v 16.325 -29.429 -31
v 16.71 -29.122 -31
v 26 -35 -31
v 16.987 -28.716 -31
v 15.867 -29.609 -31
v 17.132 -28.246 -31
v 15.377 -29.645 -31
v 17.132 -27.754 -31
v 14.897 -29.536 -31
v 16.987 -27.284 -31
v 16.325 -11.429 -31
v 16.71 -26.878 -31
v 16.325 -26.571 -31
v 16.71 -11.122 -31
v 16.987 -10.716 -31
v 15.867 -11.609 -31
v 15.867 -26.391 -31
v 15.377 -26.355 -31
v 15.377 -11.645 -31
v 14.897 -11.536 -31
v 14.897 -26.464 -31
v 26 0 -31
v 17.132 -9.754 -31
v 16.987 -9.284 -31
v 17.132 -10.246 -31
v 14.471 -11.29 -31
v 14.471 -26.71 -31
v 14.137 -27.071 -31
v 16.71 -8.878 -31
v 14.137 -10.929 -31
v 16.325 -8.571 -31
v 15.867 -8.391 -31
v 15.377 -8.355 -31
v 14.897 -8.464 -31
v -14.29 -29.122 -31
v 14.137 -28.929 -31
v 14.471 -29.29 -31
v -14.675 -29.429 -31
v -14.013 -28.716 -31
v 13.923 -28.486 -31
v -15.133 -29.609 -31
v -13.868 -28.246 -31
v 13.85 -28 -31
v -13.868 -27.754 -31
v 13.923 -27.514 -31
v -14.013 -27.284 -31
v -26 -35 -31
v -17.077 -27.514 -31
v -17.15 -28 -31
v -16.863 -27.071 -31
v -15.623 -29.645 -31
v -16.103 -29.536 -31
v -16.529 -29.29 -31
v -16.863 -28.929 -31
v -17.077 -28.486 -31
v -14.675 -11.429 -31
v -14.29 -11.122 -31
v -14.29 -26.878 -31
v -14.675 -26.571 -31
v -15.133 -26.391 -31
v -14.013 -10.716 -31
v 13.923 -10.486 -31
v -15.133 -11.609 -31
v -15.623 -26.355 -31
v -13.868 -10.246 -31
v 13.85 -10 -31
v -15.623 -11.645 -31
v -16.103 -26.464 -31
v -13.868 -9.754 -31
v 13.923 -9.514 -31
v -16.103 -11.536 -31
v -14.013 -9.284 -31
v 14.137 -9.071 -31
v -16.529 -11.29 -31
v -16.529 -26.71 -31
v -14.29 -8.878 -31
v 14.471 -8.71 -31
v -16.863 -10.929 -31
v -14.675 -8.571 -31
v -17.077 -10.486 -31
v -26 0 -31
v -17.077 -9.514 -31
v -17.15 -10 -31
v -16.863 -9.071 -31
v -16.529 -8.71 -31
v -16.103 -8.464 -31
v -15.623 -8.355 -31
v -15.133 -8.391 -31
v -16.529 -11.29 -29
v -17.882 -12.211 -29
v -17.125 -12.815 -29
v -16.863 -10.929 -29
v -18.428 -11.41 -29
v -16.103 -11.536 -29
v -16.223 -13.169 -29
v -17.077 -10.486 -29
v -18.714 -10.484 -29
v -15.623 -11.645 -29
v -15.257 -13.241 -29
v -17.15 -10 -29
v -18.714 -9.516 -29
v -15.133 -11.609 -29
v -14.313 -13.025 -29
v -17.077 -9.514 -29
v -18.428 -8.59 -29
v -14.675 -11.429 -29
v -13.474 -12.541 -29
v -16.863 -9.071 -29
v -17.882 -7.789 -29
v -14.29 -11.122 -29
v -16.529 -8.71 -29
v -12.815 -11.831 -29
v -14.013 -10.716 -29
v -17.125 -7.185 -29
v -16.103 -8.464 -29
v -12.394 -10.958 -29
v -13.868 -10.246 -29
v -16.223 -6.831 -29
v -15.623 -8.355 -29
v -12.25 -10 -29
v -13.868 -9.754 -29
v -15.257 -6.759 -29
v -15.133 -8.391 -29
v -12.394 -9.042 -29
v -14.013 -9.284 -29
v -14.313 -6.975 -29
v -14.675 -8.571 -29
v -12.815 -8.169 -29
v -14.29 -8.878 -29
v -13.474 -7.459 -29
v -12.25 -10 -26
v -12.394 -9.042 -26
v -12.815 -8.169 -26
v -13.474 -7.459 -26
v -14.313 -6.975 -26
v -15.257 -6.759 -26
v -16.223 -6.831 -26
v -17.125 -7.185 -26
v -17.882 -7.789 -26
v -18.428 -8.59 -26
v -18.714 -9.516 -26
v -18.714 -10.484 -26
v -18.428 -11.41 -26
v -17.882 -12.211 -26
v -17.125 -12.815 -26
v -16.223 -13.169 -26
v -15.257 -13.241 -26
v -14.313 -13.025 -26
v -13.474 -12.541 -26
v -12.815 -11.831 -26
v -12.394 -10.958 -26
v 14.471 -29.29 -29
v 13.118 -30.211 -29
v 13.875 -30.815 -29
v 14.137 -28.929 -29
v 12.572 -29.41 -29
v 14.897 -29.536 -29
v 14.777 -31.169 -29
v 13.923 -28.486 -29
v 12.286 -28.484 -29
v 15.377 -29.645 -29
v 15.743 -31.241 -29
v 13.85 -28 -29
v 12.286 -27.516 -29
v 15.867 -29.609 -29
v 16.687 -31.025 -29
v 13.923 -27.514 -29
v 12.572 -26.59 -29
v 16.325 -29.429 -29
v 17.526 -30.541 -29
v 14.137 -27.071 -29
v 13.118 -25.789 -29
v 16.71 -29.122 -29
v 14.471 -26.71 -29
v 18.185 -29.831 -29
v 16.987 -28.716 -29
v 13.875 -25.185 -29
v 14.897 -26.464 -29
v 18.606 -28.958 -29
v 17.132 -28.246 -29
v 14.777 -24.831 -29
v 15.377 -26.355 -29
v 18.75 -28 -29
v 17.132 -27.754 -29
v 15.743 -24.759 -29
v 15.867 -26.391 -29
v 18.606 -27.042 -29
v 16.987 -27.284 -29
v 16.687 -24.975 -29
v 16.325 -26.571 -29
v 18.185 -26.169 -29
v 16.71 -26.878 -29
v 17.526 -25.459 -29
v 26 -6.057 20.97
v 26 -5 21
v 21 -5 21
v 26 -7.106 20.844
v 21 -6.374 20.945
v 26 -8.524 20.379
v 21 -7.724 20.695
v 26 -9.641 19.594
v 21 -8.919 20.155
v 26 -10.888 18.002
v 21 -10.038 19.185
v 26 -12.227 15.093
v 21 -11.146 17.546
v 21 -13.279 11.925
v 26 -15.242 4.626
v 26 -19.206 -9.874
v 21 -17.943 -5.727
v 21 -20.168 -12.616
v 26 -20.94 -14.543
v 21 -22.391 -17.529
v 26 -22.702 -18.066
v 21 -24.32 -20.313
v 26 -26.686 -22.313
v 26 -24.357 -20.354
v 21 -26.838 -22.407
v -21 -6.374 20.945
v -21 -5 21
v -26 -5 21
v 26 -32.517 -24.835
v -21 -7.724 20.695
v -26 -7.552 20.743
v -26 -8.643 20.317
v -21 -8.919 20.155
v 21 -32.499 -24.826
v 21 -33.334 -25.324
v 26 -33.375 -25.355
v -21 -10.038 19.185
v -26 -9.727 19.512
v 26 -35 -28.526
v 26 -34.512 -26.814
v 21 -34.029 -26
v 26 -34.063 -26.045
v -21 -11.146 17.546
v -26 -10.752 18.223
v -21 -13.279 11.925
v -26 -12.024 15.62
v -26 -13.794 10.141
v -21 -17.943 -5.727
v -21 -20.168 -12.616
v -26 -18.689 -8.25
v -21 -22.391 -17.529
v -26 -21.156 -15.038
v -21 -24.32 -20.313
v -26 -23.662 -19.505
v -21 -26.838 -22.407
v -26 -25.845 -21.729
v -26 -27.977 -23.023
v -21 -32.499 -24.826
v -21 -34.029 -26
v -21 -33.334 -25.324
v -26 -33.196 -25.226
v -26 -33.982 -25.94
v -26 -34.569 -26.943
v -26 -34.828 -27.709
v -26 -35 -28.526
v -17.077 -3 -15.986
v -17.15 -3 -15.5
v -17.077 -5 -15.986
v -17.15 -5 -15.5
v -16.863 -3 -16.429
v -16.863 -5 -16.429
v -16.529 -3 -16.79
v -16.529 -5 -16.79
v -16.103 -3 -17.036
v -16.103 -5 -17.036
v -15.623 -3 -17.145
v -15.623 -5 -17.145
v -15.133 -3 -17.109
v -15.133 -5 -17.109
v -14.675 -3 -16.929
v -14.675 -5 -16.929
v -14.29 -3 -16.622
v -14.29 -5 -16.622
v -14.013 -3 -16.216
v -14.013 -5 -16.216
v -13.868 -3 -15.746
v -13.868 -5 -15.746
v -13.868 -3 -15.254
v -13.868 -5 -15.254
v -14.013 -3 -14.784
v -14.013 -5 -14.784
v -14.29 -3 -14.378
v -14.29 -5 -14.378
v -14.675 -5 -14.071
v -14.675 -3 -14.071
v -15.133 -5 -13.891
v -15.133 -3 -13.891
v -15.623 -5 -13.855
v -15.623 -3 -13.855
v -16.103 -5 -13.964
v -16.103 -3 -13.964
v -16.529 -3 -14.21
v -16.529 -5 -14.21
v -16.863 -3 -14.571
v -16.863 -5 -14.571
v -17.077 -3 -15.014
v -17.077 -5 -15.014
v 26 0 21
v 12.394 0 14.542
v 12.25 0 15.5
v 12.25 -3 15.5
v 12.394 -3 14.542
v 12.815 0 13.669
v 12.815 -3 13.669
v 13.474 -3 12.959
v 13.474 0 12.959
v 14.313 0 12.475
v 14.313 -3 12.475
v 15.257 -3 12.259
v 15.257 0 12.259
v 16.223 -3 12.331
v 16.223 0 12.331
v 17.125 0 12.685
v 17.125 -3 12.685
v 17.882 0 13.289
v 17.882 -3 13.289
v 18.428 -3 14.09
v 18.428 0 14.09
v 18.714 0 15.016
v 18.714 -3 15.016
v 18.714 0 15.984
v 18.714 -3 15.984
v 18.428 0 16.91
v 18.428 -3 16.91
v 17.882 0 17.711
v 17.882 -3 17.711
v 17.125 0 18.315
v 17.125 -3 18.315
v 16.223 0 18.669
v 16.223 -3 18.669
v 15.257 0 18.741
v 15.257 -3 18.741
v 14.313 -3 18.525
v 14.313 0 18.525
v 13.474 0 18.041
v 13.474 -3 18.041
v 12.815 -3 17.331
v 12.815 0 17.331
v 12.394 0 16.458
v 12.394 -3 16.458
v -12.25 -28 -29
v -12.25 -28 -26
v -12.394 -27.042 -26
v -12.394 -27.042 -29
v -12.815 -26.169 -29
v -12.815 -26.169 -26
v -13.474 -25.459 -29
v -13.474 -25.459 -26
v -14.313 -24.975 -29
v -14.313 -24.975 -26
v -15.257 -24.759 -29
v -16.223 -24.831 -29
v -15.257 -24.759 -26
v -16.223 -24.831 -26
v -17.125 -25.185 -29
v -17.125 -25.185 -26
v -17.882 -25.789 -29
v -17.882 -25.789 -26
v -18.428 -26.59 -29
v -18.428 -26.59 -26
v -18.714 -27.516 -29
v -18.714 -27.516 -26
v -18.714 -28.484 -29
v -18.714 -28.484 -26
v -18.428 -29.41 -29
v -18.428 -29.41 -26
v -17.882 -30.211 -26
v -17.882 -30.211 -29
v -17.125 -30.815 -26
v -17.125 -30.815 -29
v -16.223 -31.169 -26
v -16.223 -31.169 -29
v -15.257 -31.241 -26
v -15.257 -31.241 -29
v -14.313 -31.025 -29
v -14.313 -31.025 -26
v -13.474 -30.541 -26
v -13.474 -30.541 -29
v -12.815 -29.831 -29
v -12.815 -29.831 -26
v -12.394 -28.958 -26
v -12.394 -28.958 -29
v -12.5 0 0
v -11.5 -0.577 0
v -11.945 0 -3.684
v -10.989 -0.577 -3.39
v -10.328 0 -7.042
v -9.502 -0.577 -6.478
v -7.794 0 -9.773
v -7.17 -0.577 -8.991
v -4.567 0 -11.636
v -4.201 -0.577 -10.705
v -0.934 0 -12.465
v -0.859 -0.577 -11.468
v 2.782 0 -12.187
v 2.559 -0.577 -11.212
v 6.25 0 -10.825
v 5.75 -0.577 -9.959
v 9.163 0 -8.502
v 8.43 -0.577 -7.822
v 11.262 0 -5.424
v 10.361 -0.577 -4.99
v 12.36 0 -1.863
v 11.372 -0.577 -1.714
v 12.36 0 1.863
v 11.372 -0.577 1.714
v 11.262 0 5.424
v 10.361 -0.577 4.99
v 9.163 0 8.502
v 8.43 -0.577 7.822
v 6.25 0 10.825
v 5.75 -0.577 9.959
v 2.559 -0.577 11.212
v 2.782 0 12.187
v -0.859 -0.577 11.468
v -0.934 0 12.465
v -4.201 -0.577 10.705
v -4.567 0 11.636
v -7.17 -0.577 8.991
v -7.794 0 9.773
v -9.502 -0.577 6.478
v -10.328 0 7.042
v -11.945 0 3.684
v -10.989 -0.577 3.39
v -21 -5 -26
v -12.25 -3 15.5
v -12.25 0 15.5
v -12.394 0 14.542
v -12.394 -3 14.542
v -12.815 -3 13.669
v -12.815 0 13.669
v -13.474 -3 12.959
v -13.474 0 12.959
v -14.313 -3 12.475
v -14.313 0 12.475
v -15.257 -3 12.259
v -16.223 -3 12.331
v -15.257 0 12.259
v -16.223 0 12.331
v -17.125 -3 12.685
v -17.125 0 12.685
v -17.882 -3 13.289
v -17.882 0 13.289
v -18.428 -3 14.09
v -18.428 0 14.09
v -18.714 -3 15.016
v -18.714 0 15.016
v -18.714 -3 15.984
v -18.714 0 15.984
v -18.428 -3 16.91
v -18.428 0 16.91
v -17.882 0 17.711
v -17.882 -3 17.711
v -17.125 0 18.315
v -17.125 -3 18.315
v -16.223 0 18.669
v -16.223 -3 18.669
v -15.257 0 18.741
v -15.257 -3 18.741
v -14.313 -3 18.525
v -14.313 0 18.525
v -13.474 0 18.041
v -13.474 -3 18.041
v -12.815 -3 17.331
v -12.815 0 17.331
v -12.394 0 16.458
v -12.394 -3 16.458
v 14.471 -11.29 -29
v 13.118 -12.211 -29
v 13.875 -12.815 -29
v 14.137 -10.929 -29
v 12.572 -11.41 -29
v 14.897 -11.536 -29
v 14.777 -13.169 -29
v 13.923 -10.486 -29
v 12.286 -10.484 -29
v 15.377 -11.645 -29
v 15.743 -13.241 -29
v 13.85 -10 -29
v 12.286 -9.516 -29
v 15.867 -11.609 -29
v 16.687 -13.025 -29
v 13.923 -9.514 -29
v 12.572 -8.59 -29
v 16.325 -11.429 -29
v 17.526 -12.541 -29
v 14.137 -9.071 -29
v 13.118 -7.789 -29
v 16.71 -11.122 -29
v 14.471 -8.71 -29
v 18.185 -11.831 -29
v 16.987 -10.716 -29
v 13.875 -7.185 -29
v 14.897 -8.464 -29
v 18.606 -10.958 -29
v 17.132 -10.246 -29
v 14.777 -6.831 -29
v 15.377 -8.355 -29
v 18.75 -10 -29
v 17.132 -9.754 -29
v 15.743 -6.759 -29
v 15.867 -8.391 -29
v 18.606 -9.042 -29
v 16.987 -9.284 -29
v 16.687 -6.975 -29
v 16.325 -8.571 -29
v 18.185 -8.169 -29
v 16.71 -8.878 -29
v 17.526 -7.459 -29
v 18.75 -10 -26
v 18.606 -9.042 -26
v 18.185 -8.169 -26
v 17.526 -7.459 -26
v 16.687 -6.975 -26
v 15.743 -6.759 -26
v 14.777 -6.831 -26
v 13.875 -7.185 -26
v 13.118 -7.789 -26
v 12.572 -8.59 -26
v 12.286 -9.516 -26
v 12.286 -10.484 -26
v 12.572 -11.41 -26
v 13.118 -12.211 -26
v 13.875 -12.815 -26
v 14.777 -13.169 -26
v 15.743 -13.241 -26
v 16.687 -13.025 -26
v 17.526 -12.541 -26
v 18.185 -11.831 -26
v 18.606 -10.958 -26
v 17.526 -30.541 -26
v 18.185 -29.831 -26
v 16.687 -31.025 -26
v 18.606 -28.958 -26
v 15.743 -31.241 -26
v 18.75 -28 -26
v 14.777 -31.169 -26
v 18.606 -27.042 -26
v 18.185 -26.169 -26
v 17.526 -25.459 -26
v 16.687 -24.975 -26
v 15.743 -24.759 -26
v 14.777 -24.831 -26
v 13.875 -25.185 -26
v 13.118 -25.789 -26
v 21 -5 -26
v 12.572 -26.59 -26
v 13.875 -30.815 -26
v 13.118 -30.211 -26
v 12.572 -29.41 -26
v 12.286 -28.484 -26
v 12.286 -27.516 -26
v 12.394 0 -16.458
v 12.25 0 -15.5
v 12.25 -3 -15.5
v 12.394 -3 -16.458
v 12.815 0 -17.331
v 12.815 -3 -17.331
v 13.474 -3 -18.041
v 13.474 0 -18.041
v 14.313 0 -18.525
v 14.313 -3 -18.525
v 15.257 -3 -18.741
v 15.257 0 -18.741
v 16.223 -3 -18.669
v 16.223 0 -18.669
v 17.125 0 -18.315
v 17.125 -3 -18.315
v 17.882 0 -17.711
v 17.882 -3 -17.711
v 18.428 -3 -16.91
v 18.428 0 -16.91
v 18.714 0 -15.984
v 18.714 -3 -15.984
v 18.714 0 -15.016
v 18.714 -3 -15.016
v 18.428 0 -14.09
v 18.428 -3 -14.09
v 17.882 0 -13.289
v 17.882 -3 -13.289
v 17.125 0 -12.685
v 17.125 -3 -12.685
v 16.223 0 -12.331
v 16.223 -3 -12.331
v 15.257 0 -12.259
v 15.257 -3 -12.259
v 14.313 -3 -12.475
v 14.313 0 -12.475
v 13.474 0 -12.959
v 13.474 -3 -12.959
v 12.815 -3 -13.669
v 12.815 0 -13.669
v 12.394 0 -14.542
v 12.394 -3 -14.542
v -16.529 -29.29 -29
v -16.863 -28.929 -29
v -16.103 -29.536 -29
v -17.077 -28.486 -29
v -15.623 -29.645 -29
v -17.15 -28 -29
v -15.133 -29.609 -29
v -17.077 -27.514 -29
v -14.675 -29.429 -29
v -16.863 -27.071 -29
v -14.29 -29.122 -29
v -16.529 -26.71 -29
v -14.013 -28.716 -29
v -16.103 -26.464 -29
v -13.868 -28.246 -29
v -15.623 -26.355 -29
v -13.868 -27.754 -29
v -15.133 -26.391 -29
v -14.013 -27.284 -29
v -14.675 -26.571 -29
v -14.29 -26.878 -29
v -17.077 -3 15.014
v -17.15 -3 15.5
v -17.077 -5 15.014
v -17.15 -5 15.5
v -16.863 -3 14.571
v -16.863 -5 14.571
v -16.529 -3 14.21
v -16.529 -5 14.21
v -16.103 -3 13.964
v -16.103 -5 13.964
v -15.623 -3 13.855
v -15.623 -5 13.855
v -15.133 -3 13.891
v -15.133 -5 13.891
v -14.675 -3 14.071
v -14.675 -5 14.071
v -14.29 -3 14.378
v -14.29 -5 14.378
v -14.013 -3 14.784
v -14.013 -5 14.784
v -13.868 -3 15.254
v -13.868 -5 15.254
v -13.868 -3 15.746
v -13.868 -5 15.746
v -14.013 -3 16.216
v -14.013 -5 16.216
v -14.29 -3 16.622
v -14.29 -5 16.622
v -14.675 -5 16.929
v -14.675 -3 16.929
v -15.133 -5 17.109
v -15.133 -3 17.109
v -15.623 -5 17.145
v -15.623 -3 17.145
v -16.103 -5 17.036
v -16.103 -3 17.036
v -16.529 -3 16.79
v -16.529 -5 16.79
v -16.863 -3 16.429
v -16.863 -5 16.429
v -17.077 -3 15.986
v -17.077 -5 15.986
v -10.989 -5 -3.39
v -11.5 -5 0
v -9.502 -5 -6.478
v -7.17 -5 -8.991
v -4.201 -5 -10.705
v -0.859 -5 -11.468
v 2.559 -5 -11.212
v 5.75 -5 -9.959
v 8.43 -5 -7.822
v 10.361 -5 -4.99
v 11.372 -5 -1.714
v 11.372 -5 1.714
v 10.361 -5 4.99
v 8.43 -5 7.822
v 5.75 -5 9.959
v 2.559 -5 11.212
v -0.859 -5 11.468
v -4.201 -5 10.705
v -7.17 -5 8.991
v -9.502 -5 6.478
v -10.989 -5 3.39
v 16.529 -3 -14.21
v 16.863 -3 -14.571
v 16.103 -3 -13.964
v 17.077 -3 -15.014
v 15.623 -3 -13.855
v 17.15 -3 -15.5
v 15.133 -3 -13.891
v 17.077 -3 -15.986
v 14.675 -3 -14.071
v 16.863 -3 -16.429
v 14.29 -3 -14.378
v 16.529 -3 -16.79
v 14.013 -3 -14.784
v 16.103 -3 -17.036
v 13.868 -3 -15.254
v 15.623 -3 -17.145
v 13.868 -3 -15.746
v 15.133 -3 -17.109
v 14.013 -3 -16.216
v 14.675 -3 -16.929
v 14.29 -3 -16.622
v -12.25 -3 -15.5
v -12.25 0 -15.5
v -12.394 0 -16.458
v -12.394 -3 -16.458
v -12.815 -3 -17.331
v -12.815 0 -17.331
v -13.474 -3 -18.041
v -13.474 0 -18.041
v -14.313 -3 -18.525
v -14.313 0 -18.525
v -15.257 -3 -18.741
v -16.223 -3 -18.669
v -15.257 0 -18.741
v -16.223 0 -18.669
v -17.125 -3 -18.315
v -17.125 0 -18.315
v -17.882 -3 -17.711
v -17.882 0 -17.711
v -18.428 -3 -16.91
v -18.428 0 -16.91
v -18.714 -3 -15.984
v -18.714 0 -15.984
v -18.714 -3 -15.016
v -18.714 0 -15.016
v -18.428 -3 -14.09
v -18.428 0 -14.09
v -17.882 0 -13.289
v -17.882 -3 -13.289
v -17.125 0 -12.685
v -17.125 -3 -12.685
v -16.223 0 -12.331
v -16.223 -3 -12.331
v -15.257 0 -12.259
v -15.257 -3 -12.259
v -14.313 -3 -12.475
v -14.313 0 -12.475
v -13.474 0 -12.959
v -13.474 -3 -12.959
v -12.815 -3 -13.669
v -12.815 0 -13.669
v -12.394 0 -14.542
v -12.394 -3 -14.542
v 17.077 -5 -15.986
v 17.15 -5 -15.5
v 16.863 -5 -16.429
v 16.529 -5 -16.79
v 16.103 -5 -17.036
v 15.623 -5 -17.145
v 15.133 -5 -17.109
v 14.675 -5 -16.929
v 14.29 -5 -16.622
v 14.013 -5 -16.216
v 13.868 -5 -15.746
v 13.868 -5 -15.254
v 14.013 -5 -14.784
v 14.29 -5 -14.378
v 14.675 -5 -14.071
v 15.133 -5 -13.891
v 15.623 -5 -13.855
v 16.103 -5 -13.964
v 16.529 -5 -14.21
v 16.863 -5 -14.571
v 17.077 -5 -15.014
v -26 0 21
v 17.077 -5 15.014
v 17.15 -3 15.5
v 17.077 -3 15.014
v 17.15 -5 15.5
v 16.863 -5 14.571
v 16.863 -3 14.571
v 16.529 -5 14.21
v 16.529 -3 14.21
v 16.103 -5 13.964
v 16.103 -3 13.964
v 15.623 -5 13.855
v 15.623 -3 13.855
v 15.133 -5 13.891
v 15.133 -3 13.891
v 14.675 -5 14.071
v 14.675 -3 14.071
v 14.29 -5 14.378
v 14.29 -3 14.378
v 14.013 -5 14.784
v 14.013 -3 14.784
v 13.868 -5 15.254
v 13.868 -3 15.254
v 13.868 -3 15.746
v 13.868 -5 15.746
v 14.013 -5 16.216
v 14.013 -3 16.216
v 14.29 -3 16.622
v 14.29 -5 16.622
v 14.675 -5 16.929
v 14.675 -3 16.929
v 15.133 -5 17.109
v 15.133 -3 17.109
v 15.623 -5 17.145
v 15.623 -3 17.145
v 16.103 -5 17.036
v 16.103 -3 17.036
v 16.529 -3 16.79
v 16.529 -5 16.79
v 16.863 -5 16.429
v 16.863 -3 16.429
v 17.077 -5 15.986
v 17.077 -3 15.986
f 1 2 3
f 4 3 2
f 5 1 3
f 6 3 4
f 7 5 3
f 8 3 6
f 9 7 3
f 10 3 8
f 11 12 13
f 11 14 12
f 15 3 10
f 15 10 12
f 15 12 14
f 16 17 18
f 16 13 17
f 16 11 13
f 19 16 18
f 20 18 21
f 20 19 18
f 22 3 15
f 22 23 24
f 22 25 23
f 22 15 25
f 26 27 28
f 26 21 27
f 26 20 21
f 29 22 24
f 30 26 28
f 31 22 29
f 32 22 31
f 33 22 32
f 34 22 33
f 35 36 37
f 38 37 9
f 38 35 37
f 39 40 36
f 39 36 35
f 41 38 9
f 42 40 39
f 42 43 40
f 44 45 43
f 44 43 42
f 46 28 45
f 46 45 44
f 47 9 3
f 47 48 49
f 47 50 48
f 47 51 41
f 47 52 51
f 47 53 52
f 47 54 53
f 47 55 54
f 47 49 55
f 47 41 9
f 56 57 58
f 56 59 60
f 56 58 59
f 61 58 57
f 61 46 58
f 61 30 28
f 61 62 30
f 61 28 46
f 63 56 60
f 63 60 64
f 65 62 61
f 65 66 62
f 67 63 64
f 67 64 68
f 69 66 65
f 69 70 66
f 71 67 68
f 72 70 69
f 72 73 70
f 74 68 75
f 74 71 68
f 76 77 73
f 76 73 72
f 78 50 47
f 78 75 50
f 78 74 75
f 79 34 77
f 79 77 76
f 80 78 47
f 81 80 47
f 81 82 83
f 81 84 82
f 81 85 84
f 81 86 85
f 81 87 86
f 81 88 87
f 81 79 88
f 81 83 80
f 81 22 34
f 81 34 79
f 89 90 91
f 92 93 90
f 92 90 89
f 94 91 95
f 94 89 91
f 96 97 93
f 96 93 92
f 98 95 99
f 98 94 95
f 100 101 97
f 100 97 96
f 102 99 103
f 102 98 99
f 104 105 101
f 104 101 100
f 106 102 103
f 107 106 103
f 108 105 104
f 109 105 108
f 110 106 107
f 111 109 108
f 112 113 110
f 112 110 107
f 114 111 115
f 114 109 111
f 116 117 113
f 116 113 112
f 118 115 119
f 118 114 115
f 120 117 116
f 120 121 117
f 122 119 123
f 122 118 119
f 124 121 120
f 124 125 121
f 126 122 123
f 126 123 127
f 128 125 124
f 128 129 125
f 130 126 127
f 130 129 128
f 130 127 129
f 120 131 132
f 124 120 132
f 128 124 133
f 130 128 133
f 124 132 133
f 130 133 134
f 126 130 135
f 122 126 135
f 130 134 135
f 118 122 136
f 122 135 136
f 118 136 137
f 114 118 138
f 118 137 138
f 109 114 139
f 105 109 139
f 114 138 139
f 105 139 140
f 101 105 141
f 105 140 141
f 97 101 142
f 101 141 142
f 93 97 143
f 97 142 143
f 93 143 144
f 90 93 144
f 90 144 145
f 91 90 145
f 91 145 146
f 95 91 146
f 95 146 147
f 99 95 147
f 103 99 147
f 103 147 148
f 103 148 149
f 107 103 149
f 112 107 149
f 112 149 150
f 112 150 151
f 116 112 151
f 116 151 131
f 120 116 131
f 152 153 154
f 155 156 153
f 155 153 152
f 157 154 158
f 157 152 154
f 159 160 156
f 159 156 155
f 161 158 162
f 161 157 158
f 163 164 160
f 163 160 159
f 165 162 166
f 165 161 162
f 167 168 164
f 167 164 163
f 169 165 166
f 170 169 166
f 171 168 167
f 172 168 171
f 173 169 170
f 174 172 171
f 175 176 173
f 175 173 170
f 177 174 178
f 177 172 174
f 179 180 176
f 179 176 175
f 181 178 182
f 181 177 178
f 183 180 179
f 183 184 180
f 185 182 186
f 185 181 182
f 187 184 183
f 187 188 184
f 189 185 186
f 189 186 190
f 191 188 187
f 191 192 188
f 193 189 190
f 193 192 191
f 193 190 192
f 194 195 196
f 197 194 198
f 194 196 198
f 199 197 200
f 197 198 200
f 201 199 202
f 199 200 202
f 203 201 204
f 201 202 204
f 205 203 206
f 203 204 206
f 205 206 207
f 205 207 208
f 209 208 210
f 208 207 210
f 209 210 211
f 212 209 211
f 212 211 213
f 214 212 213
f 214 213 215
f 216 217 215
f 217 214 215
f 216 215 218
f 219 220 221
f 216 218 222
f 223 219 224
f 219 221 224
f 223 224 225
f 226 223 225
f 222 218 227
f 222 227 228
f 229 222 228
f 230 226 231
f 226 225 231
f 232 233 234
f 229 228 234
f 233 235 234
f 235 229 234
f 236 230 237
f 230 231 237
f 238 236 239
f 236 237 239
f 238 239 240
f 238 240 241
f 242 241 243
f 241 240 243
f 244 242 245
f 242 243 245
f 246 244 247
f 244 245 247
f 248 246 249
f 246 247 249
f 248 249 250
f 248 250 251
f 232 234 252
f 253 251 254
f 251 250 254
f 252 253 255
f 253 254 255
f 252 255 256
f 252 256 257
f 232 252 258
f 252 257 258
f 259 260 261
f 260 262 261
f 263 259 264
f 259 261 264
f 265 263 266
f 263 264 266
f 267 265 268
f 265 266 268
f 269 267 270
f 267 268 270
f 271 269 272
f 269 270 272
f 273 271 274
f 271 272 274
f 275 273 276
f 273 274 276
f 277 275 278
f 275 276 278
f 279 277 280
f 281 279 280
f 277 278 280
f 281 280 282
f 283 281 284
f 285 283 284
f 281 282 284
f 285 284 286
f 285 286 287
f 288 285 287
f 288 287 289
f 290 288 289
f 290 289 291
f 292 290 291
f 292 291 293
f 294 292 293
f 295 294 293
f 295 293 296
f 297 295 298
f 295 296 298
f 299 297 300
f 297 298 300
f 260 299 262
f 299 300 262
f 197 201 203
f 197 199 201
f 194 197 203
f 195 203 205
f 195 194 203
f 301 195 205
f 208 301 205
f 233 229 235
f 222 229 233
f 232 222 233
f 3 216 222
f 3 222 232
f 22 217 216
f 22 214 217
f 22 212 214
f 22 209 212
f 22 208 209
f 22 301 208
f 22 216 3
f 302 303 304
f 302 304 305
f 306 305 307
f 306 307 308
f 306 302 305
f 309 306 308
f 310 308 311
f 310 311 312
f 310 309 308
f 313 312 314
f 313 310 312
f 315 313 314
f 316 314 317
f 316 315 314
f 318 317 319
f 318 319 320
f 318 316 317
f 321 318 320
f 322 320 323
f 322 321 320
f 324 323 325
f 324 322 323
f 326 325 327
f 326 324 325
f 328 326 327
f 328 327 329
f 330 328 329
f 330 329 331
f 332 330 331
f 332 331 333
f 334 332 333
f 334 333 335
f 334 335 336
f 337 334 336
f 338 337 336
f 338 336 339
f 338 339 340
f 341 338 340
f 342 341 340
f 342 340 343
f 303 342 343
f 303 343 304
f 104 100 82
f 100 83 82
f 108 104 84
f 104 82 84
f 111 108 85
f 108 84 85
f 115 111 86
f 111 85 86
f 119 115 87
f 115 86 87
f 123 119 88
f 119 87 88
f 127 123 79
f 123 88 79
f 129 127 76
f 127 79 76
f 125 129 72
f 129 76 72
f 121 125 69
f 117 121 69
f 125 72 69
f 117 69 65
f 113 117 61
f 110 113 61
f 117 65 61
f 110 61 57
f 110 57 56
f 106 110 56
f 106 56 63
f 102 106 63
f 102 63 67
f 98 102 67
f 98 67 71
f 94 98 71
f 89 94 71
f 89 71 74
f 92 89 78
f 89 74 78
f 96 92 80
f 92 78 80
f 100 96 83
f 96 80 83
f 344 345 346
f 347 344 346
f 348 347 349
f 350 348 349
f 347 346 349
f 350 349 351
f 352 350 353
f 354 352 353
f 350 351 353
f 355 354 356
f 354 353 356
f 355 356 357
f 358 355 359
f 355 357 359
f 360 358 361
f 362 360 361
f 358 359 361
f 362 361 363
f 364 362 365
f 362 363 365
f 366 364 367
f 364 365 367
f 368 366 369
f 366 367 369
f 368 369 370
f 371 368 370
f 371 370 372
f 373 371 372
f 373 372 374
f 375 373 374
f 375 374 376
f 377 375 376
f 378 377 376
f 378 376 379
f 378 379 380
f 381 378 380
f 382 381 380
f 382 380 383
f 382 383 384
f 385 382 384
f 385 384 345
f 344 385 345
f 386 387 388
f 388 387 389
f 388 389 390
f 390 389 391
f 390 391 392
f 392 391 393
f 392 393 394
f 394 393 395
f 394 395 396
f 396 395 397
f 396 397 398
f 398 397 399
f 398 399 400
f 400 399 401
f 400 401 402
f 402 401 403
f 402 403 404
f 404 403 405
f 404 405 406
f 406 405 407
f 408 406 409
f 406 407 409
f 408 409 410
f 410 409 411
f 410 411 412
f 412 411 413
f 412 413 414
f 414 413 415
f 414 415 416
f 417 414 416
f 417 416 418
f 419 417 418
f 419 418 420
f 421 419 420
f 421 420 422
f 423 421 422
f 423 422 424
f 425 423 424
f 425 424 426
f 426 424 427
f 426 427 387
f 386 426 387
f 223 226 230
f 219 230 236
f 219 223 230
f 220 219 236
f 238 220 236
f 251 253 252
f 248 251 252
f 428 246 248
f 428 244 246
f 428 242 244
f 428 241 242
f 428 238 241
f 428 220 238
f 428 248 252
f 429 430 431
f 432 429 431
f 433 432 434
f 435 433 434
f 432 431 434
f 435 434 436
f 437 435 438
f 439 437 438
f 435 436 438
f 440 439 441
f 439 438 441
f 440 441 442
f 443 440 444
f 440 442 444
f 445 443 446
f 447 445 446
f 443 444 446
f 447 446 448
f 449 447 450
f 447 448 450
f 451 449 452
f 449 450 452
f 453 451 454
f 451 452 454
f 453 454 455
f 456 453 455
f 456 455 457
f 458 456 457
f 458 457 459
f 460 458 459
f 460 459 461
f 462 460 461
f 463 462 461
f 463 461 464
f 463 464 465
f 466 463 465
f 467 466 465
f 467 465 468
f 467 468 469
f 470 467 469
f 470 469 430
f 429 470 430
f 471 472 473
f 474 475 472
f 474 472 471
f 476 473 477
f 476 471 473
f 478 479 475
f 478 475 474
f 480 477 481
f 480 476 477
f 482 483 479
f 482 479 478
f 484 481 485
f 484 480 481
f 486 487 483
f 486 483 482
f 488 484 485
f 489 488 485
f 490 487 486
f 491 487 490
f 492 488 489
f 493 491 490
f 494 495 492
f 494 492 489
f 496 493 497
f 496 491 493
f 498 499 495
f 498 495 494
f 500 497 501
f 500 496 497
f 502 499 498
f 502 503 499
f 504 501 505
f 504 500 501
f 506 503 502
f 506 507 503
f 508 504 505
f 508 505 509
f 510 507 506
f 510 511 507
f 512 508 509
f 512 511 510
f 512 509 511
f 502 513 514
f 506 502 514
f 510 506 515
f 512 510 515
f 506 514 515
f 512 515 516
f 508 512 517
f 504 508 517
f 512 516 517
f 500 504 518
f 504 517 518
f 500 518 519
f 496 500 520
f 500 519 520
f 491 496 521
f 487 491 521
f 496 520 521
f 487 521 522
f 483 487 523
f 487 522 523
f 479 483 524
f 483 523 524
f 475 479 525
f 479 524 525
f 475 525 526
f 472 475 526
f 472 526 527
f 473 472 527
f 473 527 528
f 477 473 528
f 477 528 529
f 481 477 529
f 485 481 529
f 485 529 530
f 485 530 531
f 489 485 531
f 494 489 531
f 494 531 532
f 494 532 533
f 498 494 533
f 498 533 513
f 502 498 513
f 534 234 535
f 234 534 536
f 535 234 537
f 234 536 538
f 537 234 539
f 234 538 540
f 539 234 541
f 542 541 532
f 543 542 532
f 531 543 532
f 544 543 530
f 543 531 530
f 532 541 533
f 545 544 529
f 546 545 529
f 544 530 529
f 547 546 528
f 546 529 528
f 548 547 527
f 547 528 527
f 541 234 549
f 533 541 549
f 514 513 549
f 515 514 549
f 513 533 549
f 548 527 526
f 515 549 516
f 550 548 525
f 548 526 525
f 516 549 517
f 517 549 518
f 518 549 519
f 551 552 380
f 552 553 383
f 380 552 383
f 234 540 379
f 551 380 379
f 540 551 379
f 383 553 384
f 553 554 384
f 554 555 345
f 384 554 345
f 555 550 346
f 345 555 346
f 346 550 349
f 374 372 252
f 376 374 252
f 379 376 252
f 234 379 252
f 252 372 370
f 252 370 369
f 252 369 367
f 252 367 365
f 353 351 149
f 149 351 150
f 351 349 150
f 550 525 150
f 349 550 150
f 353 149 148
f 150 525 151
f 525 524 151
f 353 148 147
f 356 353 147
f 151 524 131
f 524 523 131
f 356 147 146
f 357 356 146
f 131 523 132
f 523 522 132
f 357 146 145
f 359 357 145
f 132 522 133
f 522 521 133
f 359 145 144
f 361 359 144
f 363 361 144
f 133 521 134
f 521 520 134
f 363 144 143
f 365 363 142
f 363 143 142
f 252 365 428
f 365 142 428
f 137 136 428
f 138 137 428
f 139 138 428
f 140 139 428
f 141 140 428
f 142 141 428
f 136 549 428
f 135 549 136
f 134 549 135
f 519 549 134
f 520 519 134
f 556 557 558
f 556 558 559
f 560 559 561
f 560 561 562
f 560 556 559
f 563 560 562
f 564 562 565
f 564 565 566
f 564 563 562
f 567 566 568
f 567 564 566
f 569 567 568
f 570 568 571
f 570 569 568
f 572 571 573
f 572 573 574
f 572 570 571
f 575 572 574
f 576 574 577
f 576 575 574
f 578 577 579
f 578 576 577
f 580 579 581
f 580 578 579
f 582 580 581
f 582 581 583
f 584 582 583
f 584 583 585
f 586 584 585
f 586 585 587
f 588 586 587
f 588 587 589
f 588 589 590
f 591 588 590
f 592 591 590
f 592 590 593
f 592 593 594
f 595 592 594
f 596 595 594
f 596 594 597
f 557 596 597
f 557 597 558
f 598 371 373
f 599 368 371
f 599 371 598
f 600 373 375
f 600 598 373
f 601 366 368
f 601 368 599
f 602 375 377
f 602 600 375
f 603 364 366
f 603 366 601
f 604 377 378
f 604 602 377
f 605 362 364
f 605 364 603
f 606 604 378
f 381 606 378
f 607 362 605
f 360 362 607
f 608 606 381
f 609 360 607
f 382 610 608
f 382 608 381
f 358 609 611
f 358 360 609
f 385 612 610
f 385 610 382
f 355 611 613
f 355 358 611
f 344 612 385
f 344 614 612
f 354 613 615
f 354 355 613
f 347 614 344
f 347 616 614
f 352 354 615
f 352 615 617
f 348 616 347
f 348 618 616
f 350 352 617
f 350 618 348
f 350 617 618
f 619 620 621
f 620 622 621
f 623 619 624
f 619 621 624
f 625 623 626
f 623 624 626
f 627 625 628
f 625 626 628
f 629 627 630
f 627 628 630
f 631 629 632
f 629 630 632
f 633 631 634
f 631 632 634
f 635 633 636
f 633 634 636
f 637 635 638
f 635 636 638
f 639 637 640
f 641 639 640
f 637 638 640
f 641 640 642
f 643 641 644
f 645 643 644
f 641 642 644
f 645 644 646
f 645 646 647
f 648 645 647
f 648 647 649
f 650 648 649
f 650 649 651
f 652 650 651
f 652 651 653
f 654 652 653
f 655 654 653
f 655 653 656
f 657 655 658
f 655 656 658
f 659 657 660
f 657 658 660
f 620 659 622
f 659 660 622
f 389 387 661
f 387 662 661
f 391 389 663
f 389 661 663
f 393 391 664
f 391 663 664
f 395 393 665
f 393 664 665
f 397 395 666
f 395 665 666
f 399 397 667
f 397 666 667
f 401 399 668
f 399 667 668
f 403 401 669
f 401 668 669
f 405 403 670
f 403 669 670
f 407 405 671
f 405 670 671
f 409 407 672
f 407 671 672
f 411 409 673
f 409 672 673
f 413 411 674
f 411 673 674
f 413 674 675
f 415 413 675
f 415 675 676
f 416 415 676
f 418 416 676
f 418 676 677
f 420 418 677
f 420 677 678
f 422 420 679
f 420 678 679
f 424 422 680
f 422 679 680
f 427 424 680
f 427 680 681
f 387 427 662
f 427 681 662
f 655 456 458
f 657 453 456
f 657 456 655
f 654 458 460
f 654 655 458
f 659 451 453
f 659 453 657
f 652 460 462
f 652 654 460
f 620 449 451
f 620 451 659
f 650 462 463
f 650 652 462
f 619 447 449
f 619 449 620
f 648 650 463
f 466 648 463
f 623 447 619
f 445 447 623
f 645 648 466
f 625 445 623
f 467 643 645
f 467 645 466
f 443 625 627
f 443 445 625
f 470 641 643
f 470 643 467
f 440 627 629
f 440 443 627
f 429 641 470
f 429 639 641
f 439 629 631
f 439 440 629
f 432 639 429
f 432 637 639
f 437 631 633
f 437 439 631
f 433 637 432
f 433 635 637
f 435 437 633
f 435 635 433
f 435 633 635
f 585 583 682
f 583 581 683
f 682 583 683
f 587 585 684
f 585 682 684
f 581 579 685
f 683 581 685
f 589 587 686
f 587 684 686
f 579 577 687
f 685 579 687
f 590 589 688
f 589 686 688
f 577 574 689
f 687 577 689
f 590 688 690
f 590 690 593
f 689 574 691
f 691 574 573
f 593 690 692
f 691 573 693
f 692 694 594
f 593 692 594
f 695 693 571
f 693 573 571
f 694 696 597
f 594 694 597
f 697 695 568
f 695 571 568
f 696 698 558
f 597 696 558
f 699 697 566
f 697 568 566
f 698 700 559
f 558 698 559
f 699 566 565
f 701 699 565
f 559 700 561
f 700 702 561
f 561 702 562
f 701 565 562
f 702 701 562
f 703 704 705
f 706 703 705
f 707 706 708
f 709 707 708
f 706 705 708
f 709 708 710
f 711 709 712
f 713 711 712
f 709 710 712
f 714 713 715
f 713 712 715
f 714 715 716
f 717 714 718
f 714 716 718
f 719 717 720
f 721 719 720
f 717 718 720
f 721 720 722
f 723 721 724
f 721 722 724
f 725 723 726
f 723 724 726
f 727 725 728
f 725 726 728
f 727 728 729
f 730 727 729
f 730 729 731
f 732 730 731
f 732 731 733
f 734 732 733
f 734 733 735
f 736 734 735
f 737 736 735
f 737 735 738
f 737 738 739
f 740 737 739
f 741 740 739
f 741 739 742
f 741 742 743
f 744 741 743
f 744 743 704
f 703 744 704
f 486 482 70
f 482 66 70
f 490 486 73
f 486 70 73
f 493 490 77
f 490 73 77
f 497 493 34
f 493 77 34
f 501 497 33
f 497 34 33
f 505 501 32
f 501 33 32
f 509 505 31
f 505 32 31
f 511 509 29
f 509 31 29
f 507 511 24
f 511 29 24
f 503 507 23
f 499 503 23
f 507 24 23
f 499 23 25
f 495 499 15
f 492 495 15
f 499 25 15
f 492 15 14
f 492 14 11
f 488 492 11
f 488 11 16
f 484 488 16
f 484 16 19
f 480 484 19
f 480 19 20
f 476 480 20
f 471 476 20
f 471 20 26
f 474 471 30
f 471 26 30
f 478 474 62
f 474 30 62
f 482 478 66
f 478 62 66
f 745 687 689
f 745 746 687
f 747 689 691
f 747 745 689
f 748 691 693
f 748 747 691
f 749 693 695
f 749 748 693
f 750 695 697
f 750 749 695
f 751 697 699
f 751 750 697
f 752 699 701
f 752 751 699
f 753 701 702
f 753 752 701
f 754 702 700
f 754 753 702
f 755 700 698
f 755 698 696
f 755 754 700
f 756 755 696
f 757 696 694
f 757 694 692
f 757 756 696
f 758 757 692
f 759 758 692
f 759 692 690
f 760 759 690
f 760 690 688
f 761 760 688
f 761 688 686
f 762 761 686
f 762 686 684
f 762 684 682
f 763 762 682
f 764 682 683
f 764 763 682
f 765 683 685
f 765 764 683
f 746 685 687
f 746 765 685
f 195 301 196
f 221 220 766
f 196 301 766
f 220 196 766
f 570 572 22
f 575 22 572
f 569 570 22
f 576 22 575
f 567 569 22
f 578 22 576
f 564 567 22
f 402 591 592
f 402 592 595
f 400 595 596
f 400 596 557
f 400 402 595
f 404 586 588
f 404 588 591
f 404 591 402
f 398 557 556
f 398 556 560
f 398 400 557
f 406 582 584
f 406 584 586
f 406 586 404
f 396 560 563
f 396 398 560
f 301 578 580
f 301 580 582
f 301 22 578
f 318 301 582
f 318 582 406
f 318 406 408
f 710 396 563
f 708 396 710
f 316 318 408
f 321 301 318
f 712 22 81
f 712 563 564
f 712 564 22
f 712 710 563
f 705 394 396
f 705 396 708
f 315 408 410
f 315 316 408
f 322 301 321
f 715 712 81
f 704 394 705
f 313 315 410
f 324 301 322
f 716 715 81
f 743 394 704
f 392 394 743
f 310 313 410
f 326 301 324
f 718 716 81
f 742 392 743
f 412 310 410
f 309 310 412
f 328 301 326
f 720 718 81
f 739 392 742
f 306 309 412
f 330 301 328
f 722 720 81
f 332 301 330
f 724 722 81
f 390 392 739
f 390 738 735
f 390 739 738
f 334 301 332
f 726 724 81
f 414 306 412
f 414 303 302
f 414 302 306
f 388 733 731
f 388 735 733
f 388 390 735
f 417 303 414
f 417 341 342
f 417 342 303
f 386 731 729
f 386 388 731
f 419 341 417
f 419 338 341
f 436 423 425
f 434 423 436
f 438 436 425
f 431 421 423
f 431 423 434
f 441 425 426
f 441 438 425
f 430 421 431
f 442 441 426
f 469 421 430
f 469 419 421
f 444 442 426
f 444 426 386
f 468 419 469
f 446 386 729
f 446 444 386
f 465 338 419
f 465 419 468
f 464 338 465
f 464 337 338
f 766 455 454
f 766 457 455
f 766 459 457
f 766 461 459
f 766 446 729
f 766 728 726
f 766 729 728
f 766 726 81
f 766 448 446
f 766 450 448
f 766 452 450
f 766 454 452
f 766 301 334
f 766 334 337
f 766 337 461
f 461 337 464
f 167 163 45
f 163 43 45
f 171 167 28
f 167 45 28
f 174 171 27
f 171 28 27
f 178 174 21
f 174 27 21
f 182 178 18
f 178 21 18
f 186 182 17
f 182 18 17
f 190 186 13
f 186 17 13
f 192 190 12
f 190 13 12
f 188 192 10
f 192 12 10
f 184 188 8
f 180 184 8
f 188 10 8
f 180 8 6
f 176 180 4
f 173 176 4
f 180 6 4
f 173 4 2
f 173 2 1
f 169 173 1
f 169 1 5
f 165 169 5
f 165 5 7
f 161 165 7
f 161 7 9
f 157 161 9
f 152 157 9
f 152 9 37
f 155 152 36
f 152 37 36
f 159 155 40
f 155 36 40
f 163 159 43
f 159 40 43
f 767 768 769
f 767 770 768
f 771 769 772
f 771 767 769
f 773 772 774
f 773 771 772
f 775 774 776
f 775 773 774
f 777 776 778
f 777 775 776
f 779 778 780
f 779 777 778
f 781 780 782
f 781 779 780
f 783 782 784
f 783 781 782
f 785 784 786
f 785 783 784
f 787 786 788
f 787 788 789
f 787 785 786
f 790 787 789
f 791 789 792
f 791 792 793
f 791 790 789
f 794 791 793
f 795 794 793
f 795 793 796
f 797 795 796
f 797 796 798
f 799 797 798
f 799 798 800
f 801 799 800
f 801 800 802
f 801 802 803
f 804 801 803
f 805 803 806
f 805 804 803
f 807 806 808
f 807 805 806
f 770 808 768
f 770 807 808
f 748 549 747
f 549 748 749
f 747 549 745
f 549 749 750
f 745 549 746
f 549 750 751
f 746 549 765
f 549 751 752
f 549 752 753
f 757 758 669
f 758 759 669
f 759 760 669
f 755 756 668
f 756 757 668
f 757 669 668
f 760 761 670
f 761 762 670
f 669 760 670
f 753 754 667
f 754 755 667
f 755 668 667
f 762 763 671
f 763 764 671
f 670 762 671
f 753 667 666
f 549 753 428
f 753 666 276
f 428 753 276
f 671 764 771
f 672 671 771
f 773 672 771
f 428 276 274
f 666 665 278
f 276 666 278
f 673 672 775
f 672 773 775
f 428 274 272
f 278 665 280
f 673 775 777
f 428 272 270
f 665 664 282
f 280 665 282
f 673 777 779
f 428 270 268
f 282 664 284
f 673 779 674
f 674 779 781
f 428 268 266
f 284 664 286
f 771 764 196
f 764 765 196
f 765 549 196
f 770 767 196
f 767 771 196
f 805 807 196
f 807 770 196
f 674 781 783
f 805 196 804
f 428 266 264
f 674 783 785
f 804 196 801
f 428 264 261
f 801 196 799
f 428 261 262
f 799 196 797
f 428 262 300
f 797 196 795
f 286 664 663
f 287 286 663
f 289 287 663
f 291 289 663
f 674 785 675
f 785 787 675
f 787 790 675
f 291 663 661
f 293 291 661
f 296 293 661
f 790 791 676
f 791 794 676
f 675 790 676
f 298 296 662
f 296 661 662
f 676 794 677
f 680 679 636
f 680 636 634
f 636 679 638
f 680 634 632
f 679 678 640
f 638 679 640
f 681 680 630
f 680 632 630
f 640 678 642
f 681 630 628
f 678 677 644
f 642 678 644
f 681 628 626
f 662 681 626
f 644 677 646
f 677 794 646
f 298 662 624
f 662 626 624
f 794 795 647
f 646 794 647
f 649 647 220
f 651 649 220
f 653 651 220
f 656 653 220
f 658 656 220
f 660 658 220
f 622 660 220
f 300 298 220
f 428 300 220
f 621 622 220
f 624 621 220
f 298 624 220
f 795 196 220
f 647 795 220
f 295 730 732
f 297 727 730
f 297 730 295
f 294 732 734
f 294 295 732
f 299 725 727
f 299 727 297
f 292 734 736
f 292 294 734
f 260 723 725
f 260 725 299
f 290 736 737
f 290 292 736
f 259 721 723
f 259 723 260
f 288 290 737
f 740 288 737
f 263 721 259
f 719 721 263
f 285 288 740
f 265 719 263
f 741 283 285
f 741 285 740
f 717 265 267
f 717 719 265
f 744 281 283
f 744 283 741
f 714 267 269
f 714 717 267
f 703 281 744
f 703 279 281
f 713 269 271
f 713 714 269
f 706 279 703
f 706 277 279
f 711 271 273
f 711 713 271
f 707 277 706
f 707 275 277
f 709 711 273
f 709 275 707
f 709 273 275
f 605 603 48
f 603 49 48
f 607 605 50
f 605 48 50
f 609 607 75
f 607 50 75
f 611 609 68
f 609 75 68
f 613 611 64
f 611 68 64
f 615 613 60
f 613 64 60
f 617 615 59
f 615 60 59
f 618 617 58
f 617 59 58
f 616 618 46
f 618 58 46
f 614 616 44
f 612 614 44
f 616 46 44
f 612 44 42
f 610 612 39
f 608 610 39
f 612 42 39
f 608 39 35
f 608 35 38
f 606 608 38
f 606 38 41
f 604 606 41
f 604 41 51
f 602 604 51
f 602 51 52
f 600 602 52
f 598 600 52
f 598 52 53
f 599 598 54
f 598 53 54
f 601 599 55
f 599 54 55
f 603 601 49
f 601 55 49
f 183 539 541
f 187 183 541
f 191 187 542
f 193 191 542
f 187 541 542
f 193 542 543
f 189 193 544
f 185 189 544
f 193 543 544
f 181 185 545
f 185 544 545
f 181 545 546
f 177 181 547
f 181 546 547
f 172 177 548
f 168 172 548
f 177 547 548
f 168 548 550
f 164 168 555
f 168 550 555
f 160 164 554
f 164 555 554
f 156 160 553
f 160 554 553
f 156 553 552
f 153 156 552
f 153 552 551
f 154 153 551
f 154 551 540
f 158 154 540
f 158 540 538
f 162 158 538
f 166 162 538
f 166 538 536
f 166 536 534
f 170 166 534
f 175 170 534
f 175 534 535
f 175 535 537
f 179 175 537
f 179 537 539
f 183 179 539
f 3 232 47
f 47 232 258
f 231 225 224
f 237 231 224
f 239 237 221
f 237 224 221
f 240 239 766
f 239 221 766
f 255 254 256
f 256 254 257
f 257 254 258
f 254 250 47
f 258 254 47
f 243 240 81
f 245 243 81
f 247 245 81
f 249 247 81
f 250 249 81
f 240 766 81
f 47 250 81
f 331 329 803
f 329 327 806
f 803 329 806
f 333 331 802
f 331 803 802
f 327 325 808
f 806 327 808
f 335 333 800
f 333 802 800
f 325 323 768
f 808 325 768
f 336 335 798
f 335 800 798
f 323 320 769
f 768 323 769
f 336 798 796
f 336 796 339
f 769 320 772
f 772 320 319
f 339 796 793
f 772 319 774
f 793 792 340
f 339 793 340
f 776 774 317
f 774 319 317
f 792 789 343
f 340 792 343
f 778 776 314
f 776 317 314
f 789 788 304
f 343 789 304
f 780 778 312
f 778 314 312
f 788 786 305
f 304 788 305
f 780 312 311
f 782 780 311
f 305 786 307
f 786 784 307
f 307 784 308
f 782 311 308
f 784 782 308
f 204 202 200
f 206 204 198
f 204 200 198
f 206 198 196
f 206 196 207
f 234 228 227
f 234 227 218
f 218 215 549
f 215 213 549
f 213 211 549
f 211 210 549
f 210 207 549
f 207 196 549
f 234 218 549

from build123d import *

# Parameters (mm, degrees)
F0_W           = 26
F0_H           = 42
F0_H_2         = 10
F1_DEPTH       = 35
F2_T           = -5
F3_D           = 3.3
F3_CBORE_D     = 6.5
F3_CBORE_DEPTH = 3
F5_D           = 23
F5_CSINK_D     = 25
F5_CSINK_ANGLE = 120
F7_DEPTH       = 52.001
F9_D           = 3.3
F9_CBORE_D     = 6.5
F9_CBORE_DEPTH = 3


with BuildPart() as f1:
    # F0 (on Front) → F1 (new body)
    with BuildSketch(Plane.XZ):
        with Locations((-13, 0)):
            Rectangle(F0_W, F0_H)
        with Locations((-13, -26)):
            Rectangle(F0_W, F0_H_2)
    extrude(amount=F1_DEPTH)

    # F2
    f2_openings = [f1.faces().sort_by_distance(p)[0] for p in [
        (-13, -17.5, 21),
        (0, -17.5, -5),
        (-13, -35, -5),
    ]]
    offset(amount=F2_T, openings=f2_openings)

    # F3 (through all)
    with Locations(Plane(origin=(0, 0, 0), x_dir=(1, 0, 0), z_dir=(0, 1, 0))):
        with Locations((-15.5, -15.5), (-15.5, 15.5)):
            CounterBoreHole(F3_D / 2, F3_CBORE_D / 2, F3_CBORE_DEPTH)

    # F4: F1 across plane


with BuildPart() as f1_1:
    add(f1.part)
    add(f1.part.mirror(Plane.YZ))

    # F5 (through all)
    with Locations(Plane(origin=(0, 0, 0), x_dir=(1, 0, 0), z_dir=(0, 1, 0))):
        with Locations((0, 0)):
            CounterSinkHole(F5_D / 2, F5_CSINK_D / 2, counter_sink_angle=F5_CSINK_ANGLE)

    # F6 (on face) → F7 (cut, through all)
    with BuildSketch(Plane(origin=(-26, 0, 0), x_dir=(0, -1, 0), z_dir=(-1, 0, 0))):
        with BuildLine():
            Line((35, 21), (5, 21))
            add(Edge.make_bspline(
                [(5, 21), (7.7449056049, 21), (13.9513526434, 19.4768436818), (19.2408397363, -24.5274589267), (33.5123126237, -23.6911051001), (34.8205749502, -27.4143324053), (35, -28.5263849619)],
                knots=[0, 0, 0, 0, 0.1819465478, 0.6072641204, 0.8324248321, 0.9192670122, 0.9192670122, 0.9192670122, 0.9192670122], degree=3))
            Line((35, -28.5263849619), (35, 21))
        make_face()
    extrude(amount=-F7_DEPTH, mode=Mode.SUBTRACT)

    # F9 (through all)
    with Locations(Plane.XY.offset(-26)):
        with Locations((-15.5, -10), (15.5, -10), (15.5, -28), (-15.5, -28)):
            CounterBoreHole(F9_D / 2, F9_CBORE_D / 2, F9_CBORE_DEPTH)


solid = f1_1.part
